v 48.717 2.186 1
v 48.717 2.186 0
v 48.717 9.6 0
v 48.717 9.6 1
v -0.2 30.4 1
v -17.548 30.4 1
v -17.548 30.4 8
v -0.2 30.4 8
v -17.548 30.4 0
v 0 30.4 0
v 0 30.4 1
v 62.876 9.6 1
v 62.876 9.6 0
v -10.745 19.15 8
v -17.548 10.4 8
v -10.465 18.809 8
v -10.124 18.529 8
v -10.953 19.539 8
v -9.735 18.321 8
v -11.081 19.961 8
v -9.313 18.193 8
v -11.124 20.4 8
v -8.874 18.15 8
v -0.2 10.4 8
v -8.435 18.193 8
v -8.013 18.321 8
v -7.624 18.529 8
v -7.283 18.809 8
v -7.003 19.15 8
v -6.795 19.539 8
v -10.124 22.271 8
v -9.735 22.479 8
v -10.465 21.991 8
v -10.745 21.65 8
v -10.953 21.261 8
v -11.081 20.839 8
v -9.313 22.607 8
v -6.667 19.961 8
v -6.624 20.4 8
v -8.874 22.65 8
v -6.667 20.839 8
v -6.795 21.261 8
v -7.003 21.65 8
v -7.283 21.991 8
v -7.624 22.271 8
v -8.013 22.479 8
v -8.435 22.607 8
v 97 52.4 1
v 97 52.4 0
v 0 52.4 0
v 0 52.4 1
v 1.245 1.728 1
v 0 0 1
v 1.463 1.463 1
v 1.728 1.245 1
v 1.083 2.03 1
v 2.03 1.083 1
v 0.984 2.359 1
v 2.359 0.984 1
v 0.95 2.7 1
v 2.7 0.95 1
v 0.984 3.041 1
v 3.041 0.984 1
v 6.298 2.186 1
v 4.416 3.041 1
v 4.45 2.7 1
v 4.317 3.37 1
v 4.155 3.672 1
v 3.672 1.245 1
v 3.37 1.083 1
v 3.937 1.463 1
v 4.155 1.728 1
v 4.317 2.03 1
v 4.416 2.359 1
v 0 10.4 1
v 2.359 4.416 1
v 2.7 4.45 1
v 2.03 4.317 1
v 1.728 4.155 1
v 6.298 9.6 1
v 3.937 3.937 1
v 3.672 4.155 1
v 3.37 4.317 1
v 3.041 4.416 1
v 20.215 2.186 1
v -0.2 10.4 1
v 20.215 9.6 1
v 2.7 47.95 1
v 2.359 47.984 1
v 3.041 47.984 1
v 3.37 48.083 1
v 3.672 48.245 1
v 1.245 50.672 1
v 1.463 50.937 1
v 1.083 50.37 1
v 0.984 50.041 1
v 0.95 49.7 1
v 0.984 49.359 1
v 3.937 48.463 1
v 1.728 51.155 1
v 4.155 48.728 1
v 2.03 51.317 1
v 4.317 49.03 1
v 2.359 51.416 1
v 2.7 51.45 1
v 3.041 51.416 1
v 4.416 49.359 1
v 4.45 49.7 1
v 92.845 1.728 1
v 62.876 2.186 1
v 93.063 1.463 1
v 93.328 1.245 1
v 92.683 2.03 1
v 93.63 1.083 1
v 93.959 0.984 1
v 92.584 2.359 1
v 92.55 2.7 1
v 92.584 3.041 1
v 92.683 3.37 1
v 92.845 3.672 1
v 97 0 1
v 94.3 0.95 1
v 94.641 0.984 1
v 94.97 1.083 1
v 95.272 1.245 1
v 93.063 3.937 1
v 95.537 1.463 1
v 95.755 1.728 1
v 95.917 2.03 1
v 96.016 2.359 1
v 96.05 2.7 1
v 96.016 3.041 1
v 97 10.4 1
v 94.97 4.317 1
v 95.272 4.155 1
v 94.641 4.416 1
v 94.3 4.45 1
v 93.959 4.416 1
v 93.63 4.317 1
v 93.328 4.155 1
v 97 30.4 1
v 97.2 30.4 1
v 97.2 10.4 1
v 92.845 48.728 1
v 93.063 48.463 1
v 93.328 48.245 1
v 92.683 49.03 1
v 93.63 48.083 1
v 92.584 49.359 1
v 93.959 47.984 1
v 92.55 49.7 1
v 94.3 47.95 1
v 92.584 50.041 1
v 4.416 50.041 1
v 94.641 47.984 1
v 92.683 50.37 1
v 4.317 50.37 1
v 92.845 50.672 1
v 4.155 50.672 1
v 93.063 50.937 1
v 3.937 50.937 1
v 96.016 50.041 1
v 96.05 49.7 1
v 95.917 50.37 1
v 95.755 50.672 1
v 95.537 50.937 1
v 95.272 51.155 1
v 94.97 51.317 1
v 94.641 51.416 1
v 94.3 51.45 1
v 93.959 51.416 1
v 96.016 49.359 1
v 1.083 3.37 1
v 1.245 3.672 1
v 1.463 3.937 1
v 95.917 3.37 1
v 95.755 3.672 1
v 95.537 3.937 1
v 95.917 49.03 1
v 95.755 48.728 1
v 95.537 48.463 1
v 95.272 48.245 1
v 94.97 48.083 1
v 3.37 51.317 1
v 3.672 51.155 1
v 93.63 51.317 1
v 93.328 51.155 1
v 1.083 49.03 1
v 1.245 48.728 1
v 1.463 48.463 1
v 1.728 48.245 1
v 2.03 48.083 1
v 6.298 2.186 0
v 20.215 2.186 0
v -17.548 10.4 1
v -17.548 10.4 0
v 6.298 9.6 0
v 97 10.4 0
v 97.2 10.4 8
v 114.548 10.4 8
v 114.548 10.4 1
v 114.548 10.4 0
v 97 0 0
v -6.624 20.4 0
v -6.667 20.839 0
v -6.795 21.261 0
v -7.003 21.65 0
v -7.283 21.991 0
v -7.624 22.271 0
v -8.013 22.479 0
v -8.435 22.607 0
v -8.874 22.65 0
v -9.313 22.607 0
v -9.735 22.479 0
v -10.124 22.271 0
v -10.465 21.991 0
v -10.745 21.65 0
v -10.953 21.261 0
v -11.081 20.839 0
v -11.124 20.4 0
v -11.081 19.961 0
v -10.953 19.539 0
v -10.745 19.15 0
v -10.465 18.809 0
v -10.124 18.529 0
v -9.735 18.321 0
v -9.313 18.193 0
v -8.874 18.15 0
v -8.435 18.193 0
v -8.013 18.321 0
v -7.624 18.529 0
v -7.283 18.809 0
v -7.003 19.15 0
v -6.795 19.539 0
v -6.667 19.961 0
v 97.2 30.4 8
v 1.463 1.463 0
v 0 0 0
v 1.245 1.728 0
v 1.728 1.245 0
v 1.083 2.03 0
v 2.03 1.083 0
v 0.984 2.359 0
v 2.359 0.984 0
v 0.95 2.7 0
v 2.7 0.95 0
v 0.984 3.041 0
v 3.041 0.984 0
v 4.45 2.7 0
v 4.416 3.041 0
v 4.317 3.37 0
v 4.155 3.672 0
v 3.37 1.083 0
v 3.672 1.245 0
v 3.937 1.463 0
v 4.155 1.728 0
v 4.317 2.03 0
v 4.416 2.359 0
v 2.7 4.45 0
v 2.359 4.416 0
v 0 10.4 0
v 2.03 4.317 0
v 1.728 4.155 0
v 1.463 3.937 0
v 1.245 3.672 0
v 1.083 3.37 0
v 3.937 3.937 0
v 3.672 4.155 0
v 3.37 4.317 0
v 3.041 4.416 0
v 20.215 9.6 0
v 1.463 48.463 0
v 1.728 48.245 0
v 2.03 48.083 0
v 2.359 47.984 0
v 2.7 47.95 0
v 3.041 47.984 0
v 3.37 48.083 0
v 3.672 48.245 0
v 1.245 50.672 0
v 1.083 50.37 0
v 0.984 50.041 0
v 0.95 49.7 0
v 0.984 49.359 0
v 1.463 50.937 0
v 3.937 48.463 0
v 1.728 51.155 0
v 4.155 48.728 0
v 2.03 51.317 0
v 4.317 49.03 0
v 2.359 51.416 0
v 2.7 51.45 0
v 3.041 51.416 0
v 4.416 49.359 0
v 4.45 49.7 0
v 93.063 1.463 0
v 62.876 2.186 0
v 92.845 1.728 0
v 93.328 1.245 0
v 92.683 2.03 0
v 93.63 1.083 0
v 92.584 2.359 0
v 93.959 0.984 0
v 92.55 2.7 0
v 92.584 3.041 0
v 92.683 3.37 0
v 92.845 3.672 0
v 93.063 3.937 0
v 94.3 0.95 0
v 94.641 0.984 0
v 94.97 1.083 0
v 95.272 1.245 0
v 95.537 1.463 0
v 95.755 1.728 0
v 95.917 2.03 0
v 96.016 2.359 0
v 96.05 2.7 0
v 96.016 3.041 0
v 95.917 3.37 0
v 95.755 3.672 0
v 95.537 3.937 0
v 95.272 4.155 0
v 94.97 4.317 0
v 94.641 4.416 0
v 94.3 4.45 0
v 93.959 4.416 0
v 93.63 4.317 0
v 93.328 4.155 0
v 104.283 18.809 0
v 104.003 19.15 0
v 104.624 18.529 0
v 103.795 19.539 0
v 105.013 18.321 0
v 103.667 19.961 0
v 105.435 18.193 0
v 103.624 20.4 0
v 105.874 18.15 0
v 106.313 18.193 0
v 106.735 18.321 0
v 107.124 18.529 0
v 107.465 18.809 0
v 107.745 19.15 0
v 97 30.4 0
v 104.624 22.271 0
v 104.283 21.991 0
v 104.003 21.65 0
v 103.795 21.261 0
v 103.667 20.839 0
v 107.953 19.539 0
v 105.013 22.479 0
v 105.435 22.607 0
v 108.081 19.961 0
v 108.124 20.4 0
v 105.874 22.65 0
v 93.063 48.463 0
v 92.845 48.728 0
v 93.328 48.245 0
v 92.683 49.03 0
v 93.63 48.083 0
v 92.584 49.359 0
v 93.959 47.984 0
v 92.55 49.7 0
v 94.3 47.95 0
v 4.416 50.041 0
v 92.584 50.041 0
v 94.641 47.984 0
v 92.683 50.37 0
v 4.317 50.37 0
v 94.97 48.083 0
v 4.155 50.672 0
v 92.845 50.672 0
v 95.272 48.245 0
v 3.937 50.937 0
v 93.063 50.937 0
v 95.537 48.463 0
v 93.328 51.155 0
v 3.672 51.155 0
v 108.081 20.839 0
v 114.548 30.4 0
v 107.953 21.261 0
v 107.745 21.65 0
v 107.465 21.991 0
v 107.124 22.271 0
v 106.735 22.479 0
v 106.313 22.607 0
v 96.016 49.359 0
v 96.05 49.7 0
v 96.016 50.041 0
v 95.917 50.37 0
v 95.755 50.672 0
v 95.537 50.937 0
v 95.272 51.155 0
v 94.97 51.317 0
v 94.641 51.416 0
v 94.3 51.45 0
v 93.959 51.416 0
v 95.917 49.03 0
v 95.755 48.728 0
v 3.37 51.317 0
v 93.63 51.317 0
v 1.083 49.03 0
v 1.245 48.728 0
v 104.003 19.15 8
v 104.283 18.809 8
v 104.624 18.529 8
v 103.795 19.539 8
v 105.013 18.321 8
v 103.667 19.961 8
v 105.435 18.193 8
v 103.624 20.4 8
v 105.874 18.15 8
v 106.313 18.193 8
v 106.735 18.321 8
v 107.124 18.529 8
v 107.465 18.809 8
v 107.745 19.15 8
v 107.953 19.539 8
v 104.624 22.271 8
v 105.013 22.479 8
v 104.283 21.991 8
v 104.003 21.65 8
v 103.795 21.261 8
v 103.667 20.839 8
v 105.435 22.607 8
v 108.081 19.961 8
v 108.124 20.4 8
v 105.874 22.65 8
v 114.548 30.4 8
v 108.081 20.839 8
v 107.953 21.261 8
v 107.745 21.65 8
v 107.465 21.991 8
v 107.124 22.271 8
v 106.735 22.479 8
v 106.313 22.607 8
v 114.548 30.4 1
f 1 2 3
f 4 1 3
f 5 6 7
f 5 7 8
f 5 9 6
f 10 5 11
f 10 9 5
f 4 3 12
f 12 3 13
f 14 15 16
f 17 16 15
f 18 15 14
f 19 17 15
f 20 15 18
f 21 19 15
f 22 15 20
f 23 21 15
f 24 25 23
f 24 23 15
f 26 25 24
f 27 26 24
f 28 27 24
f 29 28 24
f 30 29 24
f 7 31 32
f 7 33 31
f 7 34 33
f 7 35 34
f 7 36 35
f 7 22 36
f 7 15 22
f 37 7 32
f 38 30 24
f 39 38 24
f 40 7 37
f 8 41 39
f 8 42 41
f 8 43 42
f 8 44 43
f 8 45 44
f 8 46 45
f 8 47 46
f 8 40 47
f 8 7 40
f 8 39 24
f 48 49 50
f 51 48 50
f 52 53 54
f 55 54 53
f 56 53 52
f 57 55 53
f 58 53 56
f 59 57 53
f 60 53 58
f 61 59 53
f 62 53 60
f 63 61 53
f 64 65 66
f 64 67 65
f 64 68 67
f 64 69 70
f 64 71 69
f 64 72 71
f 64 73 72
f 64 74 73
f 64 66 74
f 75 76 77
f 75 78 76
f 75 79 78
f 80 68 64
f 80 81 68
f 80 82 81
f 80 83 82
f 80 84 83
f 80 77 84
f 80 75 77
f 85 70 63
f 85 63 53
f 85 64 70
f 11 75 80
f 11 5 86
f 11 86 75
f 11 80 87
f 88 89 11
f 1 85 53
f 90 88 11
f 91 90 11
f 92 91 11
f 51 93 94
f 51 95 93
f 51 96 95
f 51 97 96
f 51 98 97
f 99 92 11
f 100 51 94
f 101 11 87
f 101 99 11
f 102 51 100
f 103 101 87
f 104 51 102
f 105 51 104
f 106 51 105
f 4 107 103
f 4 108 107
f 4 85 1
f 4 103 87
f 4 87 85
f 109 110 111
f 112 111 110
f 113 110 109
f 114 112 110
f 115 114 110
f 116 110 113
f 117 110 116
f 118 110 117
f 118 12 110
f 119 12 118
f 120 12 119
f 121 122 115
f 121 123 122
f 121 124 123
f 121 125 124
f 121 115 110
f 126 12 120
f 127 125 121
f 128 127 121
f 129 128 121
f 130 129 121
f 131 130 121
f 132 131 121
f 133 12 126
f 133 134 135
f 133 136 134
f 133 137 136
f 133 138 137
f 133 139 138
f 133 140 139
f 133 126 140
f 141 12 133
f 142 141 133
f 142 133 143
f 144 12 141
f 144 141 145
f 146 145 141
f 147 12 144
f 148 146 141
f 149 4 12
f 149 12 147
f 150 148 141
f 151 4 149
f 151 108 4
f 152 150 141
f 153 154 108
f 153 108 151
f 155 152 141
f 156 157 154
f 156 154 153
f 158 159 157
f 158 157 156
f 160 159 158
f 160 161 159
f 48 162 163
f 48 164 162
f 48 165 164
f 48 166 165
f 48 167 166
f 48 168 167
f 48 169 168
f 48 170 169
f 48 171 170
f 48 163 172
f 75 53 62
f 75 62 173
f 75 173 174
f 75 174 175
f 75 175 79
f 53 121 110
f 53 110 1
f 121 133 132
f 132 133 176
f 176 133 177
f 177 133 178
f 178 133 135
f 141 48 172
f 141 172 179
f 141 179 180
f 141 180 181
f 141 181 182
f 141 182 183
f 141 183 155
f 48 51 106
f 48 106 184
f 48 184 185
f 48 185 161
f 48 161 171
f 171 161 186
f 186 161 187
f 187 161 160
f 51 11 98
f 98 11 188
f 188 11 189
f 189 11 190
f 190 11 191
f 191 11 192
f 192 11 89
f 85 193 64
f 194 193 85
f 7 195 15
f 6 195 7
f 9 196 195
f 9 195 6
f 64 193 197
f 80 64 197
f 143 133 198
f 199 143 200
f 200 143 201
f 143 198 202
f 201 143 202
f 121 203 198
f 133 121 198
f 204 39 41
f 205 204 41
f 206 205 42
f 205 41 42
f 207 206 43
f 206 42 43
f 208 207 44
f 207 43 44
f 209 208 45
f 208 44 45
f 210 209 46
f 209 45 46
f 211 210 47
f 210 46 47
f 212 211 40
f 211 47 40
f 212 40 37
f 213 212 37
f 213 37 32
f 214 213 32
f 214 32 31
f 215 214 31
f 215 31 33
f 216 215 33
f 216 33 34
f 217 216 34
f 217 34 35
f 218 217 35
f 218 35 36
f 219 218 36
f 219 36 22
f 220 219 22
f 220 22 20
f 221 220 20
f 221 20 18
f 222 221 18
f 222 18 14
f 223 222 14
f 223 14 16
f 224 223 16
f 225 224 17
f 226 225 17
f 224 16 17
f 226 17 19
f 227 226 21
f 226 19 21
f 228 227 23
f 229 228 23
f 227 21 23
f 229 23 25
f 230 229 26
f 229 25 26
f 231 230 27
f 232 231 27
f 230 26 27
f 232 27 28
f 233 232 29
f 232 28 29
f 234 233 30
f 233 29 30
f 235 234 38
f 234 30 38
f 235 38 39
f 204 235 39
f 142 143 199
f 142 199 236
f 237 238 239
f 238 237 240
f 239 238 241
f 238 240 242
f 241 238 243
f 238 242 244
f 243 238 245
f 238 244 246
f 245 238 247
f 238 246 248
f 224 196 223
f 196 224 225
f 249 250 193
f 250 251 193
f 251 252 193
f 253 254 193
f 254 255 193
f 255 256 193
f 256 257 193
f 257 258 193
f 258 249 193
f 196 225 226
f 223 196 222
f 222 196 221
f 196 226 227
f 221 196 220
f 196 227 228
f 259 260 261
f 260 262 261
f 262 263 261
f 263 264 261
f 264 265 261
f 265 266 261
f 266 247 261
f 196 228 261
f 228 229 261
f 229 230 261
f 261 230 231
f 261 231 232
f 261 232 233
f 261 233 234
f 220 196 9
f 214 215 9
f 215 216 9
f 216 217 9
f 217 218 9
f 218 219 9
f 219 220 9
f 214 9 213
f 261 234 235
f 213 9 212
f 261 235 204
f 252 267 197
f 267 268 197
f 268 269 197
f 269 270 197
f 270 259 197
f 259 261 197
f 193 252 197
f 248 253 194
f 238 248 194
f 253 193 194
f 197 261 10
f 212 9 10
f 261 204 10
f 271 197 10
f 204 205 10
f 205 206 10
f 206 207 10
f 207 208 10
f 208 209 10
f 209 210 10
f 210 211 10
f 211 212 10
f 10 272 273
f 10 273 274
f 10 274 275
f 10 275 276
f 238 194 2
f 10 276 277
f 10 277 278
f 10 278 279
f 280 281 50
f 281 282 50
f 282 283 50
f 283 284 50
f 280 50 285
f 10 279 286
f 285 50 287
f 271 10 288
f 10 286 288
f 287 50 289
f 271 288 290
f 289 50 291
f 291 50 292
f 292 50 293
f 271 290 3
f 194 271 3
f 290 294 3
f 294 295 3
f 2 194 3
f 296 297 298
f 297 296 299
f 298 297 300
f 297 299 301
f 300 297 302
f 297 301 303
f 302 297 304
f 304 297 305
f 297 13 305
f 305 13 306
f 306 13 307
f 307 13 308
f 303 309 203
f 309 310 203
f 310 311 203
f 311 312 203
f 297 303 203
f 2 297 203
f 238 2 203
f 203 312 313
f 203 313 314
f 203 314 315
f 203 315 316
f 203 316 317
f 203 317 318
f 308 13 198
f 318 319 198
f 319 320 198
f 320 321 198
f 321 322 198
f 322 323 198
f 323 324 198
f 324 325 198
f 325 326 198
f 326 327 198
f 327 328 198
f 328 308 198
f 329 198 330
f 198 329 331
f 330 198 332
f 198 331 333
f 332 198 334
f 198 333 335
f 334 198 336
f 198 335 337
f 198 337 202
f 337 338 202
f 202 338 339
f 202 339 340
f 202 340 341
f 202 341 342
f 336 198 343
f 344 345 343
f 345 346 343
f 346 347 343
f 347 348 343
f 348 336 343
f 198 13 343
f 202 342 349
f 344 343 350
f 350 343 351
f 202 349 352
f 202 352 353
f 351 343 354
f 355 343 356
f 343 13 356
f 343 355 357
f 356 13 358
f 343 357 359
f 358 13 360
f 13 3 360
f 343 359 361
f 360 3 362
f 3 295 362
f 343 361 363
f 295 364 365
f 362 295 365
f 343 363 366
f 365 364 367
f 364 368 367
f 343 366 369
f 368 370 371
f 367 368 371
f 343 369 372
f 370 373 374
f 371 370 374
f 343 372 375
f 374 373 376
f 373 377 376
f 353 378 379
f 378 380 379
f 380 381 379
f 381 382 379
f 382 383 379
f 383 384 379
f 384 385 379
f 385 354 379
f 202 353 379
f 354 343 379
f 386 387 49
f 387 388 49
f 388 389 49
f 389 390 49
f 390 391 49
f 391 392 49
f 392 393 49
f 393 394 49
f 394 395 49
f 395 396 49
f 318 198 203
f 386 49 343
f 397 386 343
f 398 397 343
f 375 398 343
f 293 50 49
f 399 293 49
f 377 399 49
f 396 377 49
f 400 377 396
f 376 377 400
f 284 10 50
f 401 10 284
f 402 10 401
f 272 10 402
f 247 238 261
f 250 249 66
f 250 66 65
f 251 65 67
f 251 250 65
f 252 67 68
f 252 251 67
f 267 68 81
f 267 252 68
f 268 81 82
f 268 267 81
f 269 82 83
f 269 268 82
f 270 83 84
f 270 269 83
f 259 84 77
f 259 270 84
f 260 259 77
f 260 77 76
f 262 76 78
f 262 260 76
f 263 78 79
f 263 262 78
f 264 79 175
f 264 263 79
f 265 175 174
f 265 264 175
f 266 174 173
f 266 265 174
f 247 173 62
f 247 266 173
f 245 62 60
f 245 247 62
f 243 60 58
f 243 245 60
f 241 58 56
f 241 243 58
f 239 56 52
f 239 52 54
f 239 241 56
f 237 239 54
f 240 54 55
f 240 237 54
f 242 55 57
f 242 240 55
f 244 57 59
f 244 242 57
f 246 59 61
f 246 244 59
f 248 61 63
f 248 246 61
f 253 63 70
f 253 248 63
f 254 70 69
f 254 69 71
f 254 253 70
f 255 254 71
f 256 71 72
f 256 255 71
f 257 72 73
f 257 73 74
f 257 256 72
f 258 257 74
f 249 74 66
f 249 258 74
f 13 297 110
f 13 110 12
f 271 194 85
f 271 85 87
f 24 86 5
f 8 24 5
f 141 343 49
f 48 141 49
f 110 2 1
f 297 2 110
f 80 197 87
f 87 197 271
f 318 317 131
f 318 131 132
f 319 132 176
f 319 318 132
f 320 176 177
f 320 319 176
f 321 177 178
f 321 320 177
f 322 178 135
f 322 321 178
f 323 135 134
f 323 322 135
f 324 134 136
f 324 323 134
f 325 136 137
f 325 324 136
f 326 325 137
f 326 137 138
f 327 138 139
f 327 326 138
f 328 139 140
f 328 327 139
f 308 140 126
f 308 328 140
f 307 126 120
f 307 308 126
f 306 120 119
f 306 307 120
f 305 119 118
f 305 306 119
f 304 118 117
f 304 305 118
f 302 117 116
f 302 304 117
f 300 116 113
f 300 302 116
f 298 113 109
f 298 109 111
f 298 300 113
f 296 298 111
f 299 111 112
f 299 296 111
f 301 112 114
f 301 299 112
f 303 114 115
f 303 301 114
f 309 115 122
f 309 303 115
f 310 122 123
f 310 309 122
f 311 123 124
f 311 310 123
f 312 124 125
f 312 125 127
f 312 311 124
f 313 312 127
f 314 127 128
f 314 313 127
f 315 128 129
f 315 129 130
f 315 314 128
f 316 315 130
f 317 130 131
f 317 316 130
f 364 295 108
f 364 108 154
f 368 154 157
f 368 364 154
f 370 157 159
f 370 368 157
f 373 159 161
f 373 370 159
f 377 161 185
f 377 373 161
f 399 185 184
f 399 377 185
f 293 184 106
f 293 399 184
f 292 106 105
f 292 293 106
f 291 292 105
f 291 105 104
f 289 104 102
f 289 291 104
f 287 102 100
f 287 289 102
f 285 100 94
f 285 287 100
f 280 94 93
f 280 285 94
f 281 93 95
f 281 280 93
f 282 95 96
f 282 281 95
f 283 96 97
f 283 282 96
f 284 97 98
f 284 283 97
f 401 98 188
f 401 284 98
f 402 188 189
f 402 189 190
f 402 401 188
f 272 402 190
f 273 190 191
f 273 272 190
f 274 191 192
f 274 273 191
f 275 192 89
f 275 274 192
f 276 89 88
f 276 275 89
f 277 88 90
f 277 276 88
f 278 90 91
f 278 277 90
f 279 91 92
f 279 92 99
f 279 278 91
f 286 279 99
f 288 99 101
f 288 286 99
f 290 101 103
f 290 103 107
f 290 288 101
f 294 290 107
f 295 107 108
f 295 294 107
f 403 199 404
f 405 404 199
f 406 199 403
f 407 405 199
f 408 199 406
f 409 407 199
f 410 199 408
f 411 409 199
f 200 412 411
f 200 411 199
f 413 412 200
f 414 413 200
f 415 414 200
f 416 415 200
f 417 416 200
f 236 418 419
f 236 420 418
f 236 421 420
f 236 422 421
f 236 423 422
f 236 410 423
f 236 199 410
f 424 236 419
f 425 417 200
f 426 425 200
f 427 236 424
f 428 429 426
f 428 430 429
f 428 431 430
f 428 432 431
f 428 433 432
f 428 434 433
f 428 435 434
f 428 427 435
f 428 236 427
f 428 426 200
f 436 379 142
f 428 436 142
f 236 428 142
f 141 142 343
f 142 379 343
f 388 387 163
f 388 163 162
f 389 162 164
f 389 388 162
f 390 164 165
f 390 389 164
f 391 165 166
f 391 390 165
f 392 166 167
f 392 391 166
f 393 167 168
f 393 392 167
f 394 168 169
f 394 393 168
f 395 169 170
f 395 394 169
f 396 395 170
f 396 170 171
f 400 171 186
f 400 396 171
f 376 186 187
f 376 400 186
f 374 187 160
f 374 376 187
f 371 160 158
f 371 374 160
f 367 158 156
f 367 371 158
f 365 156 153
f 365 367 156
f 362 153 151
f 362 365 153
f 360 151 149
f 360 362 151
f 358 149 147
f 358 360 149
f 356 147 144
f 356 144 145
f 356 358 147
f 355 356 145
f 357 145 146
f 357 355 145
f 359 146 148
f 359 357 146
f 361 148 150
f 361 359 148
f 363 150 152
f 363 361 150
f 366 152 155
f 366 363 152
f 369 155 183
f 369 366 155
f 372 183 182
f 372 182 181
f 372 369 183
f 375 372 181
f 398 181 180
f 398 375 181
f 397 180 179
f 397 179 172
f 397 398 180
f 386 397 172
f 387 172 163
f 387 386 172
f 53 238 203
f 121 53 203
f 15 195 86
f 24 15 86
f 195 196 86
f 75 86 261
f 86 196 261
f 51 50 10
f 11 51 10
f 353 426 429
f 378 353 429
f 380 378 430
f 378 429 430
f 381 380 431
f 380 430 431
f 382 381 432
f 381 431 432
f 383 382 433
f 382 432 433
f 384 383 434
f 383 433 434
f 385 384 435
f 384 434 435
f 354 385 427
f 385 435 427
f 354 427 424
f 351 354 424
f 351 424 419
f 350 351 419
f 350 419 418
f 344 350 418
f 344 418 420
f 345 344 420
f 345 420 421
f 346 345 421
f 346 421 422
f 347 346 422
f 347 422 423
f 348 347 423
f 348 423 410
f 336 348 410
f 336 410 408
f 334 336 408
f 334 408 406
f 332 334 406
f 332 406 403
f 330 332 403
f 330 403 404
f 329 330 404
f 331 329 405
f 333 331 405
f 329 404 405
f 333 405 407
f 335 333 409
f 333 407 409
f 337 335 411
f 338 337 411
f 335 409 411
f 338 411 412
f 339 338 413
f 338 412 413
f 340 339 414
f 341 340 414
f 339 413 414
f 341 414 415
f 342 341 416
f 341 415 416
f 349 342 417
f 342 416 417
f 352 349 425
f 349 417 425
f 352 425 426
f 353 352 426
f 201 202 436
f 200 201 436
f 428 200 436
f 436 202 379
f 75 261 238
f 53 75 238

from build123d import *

# Parameters (mm, degrees)
SKIZZE1_R                       = 1.75
SKIZZE1_W                       = 13.916164063
SKIZZE1_H                       = 7.413667428
SKIZZE1_W_2                     = 14.158947343
AUFSATZ_LINEAR_AUSTRAGEN1_DEPTH = 1
SKIZZE2_W                       = 17.347708731
SKIZZE2_H                       = 20
AUFSATZ_LINEAR_AUSTRAGEN2_DEPTH = 7
SKIZZE3_R                       = 2.25
SCHNITT_LINEAR_AUSTRAGEN1_DEPTH = 9


with BuildPart() as part:
    # Skizze1 → Aufsatz-Linear austragen1 (new body)
    with BuildSketch(Plane.XY):
        Polygon((0, 0), (97, 0), (97, 10.4), (114.547708731, 10.4), (114.547708731, 30.4), (97, 30.4), (97, 52.4), (0, 52.4), (0, 30.4), (-17.547708731, 30.4), (-17.547708731, 10.4), (0, 10.4), align=None)
        with Locations((94.3, 49.7)):
            Circle(SKIZZE1_R, mode=Mode.SUBTRACT)
        with Locations((94.3, 2.7)):
            Circle(SKIZZE1_R, mode=Mode.SUBTRACT)
        with Locations((2.7, 2.7)):
            Circle(SKIZZE1_R, mode=Mode.SUBTRACT)
        with Locations((2.7, 49.7)):
            Circle(SKIZZE1_R, mode=Mode.SUBTRACT)
        with Locations((13.256540885, 5.892760701)):
            Rectangle(SKIZZE1_W, SKIZZE1_H, mode=Mode.SUBTRACT)
        with Locations((55.796081341, 5.892760701)):
            Rectangle(SKIZZE1_W_2, SKIZZE1_H, mode=Mode.SUBTRACT)
    extrude(amount=AUFSATZ_LINEAR_AUSTRAGEN1_DEPTH)

    # Skizze2 → Aufsatz-Linear austragen2 (add)
    with BuildSketch(Plane.XY.offset(1)):
        with Locations((-8.873854365, 20.4)):
            Rectangle(SKIZZE2_W, SKIZZE2_H)
        with Locations((105.873854365, 20.4)):
            Rectangle(SKIZZE2_W, SKIZZE2_H)
    extrude(amount=AUFSATZ_LINEAR_AUSTRAGEN2_DEPTH)

    # Skizze3 → Schnitt-Linear austragen1 (cut, through all)
    with BuildSketch(Plane.XY.offset(8)):
        with Locations((-8.873854365, 20.4)):
            Circle(SKIZZE3_R)
        with Locations((105.873854365, 20.4)):
            Circle(SKIZZE3_R)
    extrude(amount=-SCHNITT_LINEAR_AUSTRAGEN1_DEPTH, mode=Mode.SUBTRACT)


solid = part.part
